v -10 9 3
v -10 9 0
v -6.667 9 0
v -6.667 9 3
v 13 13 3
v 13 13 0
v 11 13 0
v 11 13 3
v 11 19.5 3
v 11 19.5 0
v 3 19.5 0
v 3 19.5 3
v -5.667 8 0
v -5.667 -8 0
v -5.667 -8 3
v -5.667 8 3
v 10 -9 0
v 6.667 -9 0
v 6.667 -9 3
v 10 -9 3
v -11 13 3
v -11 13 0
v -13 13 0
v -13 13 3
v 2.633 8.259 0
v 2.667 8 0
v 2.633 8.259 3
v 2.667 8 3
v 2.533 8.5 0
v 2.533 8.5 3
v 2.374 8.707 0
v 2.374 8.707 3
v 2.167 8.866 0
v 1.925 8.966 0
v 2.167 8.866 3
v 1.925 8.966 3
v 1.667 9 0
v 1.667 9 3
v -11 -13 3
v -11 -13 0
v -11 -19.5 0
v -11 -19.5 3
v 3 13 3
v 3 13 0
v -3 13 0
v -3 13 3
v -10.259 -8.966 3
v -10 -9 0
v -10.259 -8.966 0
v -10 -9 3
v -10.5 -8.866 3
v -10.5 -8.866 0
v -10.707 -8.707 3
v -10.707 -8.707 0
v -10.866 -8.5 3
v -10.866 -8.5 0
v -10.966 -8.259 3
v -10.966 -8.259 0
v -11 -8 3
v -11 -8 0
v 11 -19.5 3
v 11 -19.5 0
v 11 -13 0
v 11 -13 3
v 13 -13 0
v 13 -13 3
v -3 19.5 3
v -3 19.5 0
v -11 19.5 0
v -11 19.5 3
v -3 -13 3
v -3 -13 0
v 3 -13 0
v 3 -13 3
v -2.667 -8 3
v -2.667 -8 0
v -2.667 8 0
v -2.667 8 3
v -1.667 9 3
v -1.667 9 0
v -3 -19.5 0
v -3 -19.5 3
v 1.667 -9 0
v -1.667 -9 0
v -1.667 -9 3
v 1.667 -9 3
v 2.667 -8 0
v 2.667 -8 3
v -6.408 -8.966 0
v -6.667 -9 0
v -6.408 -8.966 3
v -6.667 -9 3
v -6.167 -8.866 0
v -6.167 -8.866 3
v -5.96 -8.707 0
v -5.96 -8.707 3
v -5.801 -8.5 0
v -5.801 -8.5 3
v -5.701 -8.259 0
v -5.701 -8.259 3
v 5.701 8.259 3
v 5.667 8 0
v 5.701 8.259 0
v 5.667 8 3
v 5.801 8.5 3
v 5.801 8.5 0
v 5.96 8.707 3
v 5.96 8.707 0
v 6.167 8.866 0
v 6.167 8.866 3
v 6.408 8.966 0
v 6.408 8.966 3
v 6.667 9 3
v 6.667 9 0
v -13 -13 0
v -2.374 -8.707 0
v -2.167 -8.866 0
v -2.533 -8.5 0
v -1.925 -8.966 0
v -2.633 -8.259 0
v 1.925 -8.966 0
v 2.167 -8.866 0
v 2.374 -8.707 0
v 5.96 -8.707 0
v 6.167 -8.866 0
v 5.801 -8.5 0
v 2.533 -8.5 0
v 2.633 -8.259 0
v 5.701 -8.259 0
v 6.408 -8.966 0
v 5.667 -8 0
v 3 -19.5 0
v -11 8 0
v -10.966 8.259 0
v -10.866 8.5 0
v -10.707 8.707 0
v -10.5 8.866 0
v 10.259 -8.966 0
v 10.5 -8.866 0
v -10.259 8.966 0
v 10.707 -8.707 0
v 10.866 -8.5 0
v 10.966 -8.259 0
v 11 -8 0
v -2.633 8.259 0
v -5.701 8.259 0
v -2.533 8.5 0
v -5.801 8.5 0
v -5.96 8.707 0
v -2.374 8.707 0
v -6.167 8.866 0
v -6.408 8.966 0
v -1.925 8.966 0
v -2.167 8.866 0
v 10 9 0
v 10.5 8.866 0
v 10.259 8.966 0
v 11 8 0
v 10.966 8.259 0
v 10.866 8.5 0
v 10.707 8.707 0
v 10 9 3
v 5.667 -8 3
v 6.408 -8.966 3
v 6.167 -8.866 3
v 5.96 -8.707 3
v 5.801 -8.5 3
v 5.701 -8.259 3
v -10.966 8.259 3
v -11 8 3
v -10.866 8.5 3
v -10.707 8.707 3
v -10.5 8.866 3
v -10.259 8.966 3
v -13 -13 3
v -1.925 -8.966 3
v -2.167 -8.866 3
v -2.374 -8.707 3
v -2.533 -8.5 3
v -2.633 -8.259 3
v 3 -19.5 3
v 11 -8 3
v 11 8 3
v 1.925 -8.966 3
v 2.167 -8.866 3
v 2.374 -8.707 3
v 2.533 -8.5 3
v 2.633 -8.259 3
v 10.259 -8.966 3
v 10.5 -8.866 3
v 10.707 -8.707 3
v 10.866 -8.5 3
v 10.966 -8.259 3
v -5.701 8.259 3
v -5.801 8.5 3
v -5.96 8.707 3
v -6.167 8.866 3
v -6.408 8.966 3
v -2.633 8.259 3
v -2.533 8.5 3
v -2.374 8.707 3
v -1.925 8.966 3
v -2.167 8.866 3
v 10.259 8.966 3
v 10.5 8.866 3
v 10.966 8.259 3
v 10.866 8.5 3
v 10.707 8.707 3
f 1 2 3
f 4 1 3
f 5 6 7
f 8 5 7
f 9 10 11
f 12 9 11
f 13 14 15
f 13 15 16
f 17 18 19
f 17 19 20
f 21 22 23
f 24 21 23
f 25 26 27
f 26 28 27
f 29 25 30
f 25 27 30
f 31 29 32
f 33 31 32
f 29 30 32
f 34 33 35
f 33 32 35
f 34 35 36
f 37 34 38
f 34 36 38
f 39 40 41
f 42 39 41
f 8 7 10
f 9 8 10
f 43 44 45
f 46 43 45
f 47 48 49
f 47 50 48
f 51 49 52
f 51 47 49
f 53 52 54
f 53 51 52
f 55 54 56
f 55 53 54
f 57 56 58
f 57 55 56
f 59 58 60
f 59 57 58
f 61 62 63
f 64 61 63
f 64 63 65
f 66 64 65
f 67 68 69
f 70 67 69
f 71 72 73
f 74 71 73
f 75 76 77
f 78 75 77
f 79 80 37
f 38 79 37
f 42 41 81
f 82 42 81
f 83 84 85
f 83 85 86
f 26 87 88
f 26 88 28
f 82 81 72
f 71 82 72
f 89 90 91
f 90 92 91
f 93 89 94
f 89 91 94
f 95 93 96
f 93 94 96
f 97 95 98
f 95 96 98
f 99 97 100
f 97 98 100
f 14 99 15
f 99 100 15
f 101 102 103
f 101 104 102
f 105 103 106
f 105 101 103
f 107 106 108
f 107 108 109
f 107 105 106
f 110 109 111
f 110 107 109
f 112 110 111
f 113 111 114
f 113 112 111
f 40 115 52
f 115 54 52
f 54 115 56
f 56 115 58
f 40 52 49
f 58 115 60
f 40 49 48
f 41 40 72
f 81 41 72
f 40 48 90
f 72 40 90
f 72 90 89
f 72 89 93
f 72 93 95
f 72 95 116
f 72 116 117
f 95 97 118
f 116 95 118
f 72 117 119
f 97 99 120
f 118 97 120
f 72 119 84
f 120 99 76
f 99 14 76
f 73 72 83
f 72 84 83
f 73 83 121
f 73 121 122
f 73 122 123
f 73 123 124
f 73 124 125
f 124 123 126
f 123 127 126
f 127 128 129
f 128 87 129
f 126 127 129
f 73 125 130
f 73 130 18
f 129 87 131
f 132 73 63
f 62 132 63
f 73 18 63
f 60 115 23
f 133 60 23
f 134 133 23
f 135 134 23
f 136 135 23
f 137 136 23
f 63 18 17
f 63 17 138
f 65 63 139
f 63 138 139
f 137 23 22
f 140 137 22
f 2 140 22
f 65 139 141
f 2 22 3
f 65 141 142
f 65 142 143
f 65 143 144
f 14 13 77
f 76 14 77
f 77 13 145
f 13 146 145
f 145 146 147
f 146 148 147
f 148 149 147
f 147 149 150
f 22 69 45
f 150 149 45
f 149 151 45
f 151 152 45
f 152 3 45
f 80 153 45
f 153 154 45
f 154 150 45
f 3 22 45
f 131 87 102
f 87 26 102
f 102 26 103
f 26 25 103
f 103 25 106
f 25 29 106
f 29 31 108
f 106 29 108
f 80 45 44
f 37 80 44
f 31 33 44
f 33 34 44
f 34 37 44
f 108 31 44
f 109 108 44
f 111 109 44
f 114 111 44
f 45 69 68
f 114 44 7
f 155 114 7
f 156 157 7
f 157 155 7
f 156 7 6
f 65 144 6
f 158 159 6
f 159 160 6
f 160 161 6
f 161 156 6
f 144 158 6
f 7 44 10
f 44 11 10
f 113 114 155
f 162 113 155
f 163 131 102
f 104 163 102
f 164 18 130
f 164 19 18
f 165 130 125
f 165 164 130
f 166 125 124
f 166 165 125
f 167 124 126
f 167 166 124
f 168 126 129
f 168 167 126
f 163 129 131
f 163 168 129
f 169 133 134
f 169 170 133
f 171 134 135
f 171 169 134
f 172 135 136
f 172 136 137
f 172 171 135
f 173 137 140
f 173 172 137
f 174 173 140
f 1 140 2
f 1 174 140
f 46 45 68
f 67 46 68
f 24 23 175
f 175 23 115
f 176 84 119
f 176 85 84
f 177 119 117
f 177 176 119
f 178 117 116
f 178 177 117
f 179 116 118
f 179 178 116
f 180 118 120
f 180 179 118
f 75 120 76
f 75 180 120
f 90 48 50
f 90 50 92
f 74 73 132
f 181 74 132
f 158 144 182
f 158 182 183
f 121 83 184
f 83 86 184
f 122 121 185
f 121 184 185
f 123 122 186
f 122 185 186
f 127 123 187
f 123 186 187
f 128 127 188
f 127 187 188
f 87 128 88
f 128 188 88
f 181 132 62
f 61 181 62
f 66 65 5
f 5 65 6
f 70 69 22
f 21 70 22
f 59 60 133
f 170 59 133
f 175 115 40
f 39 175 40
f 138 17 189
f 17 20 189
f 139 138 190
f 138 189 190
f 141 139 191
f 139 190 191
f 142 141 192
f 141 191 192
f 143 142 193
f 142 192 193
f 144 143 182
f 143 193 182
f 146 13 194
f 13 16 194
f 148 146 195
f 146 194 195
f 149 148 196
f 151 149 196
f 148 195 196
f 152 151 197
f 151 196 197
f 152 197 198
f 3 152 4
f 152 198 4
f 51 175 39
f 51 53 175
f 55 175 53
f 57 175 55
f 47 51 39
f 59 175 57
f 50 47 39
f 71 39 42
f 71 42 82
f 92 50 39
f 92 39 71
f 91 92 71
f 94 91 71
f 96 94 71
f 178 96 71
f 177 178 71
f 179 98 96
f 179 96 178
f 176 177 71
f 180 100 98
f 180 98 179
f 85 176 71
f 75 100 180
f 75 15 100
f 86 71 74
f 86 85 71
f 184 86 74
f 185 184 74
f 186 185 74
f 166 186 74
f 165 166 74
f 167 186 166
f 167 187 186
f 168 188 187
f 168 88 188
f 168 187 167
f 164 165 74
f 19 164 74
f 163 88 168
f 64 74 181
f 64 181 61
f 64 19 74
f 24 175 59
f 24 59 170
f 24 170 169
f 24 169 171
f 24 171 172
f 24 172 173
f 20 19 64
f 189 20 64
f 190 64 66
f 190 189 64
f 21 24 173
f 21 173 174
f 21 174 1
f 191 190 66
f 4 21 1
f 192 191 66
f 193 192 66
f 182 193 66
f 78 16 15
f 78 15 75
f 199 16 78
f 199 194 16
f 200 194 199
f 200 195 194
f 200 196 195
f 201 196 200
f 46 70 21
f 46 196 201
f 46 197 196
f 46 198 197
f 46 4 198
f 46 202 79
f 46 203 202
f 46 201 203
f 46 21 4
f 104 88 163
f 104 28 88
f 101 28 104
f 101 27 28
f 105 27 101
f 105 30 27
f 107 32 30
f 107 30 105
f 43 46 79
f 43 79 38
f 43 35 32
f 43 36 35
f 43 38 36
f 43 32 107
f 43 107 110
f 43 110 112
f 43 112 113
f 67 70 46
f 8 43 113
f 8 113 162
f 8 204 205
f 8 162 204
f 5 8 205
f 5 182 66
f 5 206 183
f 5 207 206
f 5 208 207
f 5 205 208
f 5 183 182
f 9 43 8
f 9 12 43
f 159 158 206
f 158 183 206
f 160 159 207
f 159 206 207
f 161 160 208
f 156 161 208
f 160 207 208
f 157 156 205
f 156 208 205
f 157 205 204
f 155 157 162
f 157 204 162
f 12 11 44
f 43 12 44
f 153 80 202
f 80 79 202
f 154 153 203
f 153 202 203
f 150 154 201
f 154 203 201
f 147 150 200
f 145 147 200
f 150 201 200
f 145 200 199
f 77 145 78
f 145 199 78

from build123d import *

# Parameters (mm, degrees)
SKETCH_1_W      = 5.333333333
SKETCH_1_H      = 18
SKETCH_1_W_2    = 5.333333334
EXTRUDE_1_DEPTH = 3
FILLET_2_R      = 1


with BuildPart() as part:
    # 草图1 → 凸台-拉伸1 (new body)
    with BuildSketch(Plane.XY):
        Polygon((-11, 19.5), (-11, 13), (-13, 13), (-13, -13), (-11, -13), (-11, -19.5), (-3, -19.5), (-3, -13), (3, -13), (3, -19.5), (11, -19.5), (11, -13), (13, -13), (13, 13), (11, 13), (11, 19.5), (3, 19.5), (3, 13), (-3, 13), (-3, 19.5), align=None)
        with Locations((8.333333334, 0)):
            Rectangle(SKETCH_1_W, SKETCH_1_H, mode=Mode.SUBTRACT)
        with Locations((-8.333333334, 0)):
            Rectangle(SKETCH_1_W, SKETCH_1_H, mode=Mode.SUBTRACT)
        Rectangle(SKETCH_1_W_2, SKETCH_1_H, mode=Mode.SUBTRACT)
    extrude(amount=EXTRUDE_1_DEPTH)

    # 圆角2
    fillet_2_edges = [part.edges().sort_by_distance(p)[0] for p in [
        (5.666666667, 9, 1.5),
        (5.666666667, -9, 1.5),
        (11, -9, 1.5),
        (11, 9, 1.5),
        (-11, 9, 1.5),
        (-11, -9, 1.5),
        (-5.666666667, -9, 1.5),
        (-5.666666667, 9, 1.5),
        (-2.666666667, 9, 1.5),
        (-2.666666667, -9, 1.5),
        (2.666666667, -9, 1.5),
        (2.666666667, 9, 1.5),
    ]]
    fillet(fillet_2_edges, radius=FILLET_2_R)


solid = part.part
